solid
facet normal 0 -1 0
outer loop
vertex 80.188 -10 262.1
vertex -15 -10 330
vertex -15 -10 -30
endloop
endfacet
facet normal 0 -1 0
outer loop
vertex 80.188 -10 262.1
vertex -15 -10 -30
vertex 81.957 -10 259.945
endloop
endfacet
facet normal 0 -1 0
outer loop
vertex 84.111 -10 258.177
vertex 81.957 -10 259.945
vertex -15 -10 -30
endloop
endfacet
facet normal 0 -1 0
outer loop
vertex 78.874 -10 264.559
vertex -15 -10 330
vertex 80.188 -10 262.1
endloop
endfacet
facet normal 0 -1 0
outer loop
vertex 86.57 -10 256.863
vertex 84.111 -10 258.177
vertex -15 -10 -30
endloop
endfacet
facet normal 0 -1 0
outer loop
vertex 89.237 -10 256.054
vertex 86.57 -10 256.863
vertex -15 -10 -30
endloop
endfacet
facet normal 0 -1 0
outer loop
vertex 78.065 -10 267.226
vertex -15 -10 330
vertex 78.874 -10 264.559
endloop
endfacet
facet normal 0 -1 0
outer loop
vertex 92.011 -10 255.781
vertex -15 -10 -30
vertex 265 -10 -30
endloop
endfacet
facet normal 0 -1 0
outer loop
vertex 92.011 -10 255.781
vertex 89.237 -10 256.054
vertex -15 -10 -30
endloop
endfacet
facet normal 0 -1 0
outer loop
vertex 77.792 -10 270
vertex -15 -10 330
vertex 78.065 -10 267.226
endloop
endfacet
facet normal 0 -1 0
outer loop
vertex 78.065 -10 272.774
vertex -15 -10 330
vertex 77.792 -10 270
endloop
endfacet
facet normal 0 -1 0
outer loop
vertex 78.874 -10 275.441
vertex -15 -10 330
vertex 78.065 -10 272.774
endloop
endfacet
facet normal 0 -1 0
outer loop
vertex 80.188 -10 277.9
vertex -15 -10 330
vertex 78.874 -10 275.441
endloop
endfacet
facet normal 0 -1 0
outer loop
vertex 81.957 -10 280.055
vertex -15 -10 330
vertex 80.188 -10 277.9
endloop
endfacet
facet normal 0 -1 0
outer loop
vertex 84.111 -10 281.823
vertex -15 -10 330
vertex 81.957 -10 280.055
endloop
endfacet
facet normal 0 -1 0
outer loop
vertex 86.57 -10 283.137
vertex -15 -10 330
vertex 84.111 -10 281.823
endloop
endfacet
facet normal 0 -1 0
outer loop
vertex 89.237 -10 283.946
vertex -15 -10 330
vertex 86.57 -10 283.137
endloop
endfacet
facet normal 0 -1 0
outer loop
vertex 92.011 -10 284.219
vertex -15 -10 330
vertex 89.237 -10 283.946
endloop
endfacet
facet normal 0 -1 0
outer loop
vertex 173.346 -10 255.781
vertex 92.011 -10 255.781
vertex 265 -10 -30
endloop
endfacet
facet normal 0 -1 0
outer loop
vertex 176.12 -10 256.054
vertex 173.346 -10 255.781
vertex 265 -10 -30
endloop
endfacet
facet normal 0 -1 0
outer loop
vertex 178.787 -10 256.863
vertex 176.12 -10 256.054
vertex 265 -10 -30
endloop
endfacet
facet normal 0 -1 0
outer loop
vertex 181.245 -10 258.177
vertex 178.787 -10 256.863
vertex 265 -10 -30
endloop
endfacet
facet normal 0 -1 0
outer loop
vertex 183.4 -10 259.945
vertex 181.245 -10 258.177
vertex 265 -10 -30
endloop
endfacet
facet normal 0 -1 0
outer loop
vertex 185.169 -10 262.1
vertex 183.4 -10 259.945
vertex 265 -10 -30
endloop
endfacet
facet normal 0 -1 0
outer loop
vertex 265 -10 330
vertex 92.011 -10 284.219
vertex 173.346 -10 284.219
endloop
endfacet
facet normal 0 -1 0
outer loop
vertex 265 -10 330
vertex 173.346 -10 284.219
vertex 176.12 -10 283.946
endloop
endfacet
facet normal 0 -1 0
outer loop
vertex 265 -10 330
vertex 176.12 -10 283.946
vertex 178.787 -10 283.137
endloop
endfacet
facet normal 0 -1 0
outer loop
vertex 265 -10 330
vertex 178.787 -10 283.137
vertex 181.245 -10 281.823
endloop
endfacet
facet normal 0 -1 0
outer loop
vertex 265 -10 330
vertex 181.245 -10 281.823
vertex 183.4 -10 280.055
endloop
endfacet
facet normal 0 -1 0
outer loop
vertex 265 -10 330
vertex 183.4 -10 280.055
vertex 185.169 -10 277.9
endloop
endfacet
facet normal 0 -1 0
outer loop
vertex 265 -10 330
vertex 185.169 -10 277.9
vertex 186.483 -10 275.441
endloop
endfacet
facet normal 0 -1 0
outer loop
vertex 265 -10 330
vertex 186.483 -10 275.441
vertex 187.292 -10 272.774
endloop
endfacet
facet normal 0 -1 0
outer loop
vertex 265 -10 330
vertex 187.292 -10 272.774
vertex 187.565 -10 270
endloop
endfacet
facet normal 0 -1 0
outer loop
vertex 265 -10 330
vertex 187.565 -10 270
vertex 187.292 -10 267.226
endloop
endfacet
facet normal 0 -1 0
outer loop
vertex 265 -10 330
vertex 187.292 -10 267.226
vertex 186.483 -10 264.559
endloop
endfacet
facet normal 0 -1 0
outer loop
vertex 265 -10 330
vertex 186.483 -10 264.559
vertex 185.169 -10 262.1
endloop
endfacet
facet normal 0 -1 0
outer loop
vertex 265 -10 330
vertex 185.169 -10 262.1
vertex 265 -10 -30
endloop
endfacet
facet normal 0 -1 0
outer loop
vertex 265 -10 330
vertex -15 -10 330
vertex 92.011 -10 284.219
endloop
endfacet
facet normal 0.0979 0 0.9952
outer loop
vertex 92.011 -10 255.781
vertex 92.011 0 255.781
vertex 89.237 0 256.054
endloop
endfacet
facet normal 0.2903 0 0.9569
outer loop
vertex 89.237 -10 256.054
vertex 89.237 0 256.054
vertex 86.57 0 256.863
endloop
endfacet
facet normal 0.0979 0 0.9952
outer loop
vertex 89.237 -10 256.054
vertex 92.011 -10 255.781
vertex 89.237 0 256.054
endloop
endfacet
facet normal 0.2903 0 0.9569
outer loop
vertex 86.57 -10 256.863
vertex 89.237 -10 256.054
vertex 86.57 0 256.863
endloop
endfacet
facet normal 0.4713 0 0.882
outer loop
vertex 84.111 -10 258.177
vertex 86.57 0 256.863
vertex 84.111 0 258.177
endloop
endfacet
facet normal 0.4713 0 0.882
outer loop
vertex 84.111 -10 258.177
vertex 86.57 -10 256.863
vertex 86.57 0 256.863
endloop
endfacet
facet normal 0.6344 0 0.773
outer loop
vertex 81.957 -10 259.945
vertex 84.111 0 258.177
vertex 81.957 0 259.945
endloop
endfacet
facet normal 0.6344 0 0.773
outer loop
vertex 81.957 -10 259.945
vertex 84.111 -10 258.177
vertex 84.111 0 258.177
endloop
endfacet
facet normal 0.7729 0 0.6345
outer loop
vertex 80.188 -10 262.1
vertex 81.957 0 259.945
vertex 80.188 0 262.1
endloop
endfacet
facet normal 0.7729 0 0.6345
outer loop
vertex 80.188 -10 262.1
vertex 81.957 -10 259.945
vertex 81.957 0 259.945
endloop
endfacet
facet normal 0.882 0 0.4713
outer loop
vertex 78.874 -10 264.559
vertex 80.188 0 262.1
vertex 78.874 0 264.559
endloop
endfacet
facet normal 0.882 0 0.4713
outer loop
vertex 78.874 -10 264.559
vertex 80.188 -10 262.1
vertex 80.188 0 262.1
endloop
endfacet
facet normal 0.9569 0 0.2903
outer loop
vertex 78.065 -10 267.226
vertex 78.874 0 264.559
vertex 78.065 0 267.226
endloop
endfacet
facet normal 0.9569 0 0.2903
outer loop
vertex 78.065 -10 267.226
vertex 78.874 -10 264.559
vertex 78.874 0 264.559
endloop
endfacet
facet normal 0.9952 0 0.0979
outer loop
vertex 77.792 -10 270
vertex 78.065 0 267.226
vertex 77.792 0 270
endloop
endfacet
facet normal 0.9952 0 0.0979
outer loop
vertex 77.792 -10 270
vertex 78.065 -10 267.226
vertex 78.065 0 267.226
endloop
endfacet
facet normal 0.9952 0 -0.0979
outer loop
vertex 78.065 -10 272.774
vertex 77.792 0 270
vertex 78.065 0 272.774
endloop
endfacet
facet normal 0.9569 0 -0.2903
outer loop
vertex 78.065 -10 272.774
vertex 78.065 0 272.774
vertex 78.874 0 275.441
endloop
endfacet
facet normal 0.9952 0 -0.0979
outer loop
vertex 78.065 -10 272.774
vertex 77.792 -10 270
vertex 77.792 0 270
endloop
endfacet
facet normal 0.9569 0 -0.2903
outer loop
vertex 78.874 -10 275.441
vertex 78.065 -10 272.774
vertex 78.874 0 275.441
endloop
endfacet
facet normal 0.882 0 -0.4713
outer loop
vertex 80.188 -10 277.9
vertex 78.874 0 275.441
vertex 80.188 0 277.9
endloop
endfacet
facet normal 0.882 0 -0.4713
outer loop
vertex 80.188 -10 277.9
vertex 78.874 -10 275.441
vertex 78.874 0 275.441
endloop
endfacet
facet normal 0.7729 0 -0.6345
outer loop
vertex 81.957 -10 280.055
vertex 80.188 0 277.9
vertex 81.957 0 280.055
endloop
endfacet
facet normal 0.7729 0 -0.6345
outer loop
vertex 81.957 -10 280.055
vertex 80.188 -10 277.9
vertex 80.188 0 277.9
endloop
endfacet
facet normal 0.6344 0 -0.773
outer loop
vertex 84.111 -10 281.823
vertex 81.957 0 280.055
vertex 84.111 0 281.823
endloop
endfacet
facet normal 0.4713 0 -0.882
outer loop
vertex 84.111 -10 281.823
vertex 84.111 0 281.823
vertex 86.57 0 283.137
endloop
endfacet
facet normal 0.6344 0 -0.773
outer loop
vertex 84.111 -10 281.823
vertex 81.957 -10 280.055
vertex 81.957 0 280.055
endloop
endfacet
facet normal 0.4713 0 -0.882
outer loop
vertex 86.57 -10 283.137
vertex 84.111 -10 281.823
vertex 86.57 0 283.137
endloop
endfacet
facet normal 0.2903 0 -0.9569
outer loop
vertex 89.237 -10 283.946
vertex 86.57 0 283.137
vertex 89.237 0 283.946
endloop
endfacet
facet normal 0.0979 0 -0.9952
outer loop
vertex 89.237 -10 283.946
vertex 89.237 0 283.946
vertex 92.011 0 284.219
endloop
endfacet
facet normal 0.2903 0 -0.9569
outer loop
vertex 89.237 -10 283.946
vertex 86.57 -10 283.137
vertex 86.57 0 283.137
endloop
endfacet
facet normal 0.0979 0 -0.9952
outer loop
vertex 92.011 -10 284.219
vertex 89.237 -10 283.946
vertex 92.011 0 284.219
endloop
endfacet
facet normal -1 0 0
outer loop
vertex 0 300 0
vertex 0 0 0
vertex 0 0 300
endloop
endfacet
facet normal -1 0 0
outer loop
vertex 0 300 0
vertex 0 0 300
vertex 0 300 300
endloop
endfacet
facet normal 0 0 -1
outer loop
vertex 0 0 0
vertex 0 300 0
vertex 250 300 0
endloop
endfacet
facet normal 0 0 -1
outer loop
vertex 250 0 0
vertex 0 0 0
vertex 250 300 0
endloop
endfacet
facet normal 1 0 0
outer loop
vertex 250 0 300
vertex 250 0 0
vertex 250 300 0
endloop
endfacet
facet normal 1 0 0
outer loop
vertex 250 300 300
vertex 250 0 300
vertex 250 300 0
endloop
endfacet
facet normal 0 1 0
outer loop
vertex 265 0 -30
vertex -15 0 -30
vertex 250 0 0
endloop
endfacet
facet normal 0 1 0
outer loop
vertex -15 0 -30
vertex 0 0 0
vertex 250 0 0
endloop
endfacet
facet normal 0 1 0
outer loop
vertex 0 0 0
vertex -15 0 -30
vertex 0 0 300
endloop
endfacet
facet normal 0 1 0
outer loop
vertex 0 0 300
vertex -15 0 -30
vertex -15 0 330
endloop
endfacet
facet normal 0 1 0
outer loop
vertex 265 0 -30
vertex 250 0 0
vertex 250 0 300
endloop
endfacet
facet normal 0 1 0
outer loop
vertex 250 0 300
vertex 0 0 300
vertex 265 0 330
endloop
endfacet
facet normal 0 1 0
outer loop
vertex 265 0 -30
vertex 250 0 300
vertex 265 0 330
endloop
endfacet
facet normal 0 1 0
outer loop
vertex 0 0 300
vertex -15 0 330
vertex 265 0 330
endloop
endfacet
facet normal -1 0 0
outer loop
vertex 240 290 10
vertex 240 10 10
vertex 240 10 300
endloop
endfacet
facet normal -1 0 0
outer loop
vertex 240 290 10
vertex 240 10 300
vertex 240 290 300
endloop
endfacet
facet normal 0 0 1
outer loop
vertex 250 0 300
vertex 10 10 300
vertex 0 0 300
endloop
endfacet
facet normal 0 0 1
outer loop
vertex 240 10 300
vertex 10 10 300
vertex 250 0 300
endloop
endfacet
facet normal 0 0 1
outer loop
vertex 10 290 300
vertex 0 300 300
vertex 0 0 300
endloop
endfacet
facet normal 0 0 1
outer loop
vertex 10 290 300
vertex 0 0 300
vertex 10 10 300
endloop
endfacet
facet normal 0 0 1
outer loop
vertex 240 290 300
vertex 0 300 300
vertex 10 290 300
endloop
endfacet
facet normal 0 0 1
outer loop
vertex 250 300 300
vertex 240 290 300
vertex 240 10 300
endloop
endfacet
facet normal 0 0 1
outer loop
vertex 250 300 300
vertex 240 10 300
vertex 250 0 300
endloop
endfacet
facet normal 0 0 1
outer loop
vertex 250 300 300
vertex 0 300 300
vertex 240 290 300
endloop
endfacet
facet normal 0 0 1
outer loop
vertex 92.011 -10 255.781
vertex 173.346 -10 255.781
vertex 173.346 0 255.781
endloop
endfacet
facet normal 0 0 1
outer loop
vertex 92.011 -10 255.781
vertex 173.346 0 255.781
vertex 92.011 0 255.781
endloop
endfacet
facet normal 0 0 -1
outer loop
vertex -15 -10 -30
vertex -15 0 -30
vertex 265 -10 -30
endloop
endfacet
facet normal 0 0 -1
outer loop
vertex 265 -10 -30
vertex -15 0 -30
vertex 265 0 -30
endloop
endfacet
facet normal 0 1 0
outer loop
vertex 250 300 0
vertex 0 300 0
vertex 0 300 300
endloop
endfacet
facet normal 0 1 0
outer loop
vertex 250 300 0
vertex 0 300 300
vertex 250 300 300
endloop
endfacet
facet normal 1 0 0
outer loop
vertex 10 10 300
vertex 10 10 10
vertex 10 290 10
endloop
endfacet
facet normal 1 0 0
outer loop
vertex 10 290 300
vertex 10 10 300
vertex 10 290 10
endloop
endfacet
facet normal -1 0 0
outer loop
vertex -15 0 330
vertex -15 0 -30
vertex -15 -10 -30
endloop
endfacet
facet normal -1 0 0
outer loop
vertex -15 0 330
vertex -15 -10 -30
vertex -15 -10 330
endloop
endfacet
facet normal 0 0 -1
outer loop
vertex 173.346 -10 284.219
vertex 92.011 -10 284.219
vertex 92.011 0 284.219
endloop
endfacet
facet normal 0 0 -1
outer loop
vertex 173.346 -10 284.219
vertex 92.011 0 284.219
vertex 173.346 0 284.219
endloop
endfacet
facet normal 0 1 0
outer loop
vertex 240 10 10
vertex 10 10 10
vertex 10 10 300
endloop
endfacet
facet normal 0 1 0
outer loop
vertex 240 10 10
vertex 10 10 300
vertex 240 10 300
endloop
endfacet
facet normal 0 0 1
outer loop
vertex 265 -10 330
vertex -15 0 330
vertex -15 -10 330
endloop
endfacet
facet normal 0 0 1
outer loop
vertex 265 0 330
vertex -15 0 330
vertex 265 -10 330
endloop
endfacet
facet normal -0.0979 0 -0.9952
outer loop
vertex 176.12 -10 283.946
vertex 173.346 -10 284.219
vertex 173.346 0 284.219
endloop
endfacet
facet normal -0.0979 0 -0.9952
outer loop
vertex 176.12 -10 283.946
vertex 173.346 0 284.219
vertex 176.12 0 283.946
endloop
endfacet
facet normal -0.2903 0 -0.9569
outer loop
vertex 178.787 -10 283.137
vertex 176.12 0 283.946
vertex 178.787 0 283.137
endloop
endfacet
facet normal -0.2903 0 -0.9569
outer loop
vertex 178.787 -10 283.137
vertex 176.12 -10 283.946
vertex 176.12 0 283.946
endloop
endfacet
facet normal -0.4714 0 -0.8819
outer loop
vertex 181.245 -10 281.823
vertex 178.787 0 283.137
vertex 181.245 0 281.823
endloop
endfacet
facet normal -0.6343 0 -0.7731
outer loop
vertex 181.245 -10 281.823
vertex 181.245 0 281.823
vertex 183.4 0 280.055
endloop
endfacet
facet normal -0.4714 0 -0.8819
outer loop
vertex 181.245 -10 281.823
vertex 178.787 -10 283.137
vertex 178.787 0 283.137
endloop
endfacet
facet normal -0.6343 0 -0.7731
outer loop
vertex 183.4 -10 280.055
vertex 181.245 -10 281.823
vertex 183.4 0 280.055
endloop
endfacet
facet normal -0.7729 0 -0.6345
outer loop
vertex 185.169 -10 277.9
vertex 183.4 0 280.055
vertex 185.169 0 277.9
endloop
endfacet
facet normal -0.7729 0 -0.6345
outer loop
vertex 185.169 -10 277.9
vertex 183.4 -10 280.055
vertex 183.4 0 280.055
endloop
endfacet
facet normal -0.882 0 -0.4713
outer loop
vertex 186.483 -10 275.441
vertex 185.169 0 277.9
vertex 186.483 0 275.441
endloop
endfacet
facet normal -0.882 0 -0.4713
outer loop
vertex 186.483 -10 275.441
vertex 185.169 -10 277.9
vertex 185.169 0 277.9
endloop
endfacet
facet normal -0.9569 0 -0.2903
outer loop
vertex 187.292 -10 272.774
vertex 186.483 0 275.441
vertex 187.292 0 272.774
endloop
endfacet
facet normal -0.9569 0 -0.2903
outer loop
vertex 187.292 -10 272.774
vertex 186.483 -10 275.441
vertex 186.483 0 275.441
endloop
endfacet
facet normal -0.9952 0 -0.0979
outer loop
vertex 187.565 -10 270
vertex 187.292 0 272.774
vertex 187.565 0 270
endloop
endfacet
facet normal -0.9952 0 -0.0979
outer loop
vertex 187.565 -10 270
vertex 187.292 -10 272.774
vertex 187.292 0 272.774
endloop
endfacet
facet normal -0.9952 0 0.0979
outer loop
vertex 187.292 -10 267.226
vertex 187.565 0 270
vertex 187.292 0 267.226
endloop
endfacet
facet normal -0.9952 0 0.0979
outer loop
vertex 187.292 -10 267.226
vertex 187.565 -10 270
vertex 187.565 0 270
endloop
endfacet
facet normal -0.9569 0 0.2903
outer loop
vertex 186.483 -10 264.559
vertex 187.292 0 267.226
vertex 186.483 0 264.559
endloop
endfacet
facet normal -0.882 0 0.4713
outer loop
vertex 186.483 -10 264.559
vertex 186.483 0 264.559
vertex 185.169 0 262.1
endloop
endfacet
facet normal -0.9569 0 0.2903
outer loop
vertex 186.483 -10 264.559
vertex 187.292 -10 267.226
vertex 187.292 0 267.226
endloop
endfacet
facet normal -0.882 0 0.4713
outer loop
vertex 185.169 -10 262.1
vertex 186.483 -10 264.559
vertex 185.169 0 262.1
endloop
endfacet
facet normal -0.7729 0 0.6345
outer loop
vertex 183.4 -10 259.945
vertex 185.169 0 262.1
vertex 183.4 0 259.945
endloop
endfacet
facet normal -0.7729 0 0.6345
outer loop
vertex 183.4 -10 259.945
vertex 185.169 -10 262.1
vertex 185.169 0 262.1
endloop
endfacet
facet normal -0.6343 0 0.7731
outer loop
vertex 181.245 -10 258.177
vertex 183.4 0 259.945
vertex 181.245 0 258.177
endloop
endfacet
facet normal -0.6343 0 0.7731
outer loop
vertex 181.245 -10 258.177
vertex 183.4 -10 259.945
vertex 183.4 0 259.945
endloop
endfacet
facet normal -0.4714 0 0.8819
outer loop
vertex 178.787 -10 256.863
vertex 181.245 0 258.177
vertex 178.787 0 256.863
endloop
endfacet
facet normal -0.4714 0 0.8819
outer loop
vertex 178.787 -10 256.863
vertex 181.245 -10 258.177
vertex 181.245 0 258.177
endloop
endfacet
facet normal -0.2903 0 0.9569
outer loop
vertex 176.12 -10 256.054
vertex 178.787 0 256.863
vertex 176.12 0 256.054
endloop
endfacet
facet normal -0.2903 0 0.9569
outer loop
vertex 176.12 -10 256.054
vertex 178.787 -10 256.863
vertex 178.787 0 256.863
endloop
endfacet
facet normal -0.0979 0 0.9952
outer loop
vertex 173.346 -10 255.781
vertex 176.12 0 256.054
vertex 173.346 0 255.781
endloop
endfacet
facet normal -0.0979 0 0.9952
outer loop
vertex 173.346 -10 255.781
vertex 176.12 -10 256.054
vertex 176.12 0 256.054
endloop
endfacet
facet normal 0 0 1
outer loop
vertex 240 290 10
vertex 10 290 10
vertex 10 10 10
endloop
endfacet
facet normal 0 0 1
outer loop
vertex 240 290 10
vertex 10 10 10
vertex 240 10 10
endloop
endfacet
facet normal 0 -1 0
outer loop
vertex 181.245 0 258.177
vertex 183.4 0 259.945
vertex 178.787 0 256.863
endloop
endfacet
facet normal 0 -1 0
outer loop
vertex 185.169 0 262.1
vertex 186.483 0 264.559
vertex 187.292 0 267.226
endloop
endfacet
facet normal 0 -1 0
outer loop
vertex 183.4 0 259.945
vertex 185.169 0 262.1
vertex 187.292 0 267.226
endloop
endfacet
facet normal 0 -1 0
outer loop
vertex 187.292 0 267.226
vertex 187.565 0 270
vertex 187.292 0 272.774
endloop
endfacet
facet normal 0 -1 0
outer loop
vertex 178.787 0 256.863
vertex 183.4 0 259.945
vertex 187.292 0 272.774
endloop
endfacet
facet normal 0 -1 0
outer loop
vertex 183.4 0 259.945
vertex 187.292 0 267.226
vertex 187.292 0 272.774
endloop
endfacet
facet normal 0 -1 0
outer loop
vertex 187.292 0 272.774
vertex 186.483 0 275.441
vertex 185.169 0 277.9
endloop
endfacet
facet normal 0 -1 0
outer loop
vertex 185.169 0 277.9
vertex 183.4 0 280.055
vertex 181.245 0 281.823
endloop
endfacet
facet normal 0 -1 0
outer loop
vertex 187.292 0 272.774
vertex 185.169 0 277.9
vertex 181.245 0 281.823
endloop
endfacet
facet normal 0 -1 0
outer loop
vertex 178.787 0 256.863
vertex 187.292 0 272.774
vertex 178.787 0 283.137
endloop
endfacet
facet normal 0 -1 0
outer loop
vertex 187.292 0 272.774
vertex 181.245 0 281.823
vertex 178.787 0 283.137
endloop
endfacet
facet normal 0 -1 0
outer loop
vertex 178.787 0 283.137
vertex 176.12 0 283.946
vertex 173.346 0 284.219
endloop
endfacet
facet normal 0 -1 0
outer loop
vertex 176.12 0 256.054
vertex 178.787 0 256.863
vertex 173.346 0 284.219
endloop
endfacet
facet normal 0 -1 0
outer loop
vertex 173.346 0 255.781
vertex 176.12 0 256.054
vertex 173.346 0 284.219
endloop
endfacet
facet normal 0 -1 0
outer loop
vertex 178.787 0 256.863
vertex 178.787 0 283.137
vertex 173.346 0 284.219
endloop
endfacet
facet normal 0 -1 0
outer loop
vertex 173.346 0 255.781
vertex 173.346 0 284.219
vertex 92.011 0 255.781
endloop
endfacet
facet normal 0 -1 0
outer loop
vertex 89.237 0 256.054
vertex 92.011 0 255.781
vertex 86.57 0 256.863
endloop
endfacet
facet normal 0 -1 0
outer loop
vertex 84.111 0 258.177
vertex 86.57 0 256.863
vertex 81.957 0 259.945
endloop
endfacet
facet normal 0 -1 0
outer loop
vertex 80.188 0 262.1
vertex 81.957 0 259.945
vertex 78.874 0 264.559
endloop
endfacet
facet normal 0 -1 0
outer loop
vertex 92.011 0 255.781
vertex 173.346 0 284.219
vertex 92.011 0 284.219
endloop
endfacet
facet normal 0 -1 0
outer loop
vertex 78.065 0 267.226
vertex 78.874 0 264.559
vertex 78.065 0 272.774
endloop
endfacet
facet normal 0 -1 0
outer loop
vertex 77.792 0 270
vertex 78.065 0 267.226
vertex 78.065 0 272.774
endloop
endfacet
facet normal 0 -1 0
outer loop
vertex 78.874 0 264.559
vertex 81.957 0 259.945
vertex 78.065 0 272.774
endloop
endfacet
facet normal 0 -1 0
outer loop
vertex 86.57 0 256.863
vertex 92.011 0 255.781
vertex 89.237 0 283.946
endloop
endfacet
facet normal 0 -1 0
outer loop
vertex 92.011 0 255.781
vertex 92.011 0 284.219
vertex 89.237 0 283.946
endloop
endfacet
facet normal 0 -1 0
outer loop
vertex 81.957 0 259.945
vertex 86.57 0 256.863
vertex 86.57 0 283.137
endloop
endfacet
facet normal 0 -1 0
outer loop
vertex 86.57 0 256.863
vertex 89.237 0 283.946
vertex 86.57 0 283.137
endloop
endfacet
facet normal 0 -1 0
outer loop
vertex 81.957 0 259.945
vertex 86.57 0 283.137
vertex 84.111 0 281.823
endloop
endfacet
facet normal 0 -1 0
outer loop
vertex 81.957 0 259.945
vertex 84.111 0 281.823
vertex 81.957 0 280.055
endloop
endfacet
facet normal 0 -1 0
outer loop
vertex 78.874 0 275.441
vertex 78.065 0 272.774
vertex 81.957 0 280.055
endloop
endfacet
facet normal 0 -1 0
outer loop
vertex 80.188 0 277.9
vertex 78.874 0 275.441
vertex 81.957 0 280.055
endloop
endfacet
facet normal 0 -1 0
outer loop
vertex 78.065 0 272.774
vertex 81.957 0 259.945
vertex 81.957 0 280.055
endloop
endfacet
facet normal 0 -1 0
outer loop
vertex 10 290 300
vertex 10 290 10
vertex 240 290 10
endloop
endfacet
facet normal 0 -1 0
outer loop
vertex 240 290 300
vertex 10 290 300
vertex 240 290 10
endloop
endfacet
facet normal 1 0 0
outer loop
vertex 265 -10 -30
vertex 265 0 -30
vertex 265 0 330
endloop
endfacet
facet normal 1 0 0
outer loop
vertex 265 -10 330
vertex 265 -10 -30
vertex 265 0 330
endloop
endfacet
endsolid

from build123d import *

# Parameters (mm, degrees)
SKETCH_1_W          = 250
SKETCH_1_H          = 300
EXTRUDE_1_DEPTH     = 300
SKETCH_2_W          = 230
SKETCH_2_H          = 280
CUT_EXTRUDE_1_DEPTH = 290
SKETCH_3_W          = 280
SKETCH_3_H          = 360
EXTRUDE_2_DEPTH     = 10
CUT_EXTRUDE_2_DEPTH = 10


with BuildPart() as part:
    # 草图1 → 凸台-拉伸1 (new body)
    with BuildSketch(Plane.XY):
        with Locations((125, 150)):
            Rectangle(SKETCH_1_W, SKETCH_1_H)
    extrude(amount=EXTRUDE_1_DEPTH)

    # 草图2 → 切除-拉伸1 (cut)
    with BuildSketch(Plane.XY.offset(300)):
        with Locations((125, 150)):
            Rectangle(SKETCH_2_W, SKETCH_2_H)
    extrude(amount=-CUT_EXTRUDE_1_DEPTH, mode=Mode.SUBTRACT)

    # 草图3 → 凸台-拉伸2 (add)
    with BuildSketch(Plane.XZ):
        with Locations((125, 150)):
            Rectangle(SKETCH_3_W, SKETCH_3_H)
    extrude(amount=EXTRUDE_2_DEPTH)

    # 草图4 → 切除-拉伸2 (cut)
    with BuildSketch(Plane.XZ.offset(10)):
        with BuildLine():
            Line((92.011234141, 284.219295629), (173.345605139, 284.219295629))
            ThreePointArc((173.345605139, 284.219295629), (187.564900768, 270), (173.345605139, 255.780704371))
            Line((173.345605139, 255.780704371), (92.011234141, 255.780704371))
            ThreePointArc((92.011234141, 255.780704371), (77.791938512, 270), (92.011234141, 284.219295629))
        make_face()
    extrude(amount=-CUT_EXTRUDE_2_DEPTH, mode=Mode.SUBTRACT)


solid = part.part
